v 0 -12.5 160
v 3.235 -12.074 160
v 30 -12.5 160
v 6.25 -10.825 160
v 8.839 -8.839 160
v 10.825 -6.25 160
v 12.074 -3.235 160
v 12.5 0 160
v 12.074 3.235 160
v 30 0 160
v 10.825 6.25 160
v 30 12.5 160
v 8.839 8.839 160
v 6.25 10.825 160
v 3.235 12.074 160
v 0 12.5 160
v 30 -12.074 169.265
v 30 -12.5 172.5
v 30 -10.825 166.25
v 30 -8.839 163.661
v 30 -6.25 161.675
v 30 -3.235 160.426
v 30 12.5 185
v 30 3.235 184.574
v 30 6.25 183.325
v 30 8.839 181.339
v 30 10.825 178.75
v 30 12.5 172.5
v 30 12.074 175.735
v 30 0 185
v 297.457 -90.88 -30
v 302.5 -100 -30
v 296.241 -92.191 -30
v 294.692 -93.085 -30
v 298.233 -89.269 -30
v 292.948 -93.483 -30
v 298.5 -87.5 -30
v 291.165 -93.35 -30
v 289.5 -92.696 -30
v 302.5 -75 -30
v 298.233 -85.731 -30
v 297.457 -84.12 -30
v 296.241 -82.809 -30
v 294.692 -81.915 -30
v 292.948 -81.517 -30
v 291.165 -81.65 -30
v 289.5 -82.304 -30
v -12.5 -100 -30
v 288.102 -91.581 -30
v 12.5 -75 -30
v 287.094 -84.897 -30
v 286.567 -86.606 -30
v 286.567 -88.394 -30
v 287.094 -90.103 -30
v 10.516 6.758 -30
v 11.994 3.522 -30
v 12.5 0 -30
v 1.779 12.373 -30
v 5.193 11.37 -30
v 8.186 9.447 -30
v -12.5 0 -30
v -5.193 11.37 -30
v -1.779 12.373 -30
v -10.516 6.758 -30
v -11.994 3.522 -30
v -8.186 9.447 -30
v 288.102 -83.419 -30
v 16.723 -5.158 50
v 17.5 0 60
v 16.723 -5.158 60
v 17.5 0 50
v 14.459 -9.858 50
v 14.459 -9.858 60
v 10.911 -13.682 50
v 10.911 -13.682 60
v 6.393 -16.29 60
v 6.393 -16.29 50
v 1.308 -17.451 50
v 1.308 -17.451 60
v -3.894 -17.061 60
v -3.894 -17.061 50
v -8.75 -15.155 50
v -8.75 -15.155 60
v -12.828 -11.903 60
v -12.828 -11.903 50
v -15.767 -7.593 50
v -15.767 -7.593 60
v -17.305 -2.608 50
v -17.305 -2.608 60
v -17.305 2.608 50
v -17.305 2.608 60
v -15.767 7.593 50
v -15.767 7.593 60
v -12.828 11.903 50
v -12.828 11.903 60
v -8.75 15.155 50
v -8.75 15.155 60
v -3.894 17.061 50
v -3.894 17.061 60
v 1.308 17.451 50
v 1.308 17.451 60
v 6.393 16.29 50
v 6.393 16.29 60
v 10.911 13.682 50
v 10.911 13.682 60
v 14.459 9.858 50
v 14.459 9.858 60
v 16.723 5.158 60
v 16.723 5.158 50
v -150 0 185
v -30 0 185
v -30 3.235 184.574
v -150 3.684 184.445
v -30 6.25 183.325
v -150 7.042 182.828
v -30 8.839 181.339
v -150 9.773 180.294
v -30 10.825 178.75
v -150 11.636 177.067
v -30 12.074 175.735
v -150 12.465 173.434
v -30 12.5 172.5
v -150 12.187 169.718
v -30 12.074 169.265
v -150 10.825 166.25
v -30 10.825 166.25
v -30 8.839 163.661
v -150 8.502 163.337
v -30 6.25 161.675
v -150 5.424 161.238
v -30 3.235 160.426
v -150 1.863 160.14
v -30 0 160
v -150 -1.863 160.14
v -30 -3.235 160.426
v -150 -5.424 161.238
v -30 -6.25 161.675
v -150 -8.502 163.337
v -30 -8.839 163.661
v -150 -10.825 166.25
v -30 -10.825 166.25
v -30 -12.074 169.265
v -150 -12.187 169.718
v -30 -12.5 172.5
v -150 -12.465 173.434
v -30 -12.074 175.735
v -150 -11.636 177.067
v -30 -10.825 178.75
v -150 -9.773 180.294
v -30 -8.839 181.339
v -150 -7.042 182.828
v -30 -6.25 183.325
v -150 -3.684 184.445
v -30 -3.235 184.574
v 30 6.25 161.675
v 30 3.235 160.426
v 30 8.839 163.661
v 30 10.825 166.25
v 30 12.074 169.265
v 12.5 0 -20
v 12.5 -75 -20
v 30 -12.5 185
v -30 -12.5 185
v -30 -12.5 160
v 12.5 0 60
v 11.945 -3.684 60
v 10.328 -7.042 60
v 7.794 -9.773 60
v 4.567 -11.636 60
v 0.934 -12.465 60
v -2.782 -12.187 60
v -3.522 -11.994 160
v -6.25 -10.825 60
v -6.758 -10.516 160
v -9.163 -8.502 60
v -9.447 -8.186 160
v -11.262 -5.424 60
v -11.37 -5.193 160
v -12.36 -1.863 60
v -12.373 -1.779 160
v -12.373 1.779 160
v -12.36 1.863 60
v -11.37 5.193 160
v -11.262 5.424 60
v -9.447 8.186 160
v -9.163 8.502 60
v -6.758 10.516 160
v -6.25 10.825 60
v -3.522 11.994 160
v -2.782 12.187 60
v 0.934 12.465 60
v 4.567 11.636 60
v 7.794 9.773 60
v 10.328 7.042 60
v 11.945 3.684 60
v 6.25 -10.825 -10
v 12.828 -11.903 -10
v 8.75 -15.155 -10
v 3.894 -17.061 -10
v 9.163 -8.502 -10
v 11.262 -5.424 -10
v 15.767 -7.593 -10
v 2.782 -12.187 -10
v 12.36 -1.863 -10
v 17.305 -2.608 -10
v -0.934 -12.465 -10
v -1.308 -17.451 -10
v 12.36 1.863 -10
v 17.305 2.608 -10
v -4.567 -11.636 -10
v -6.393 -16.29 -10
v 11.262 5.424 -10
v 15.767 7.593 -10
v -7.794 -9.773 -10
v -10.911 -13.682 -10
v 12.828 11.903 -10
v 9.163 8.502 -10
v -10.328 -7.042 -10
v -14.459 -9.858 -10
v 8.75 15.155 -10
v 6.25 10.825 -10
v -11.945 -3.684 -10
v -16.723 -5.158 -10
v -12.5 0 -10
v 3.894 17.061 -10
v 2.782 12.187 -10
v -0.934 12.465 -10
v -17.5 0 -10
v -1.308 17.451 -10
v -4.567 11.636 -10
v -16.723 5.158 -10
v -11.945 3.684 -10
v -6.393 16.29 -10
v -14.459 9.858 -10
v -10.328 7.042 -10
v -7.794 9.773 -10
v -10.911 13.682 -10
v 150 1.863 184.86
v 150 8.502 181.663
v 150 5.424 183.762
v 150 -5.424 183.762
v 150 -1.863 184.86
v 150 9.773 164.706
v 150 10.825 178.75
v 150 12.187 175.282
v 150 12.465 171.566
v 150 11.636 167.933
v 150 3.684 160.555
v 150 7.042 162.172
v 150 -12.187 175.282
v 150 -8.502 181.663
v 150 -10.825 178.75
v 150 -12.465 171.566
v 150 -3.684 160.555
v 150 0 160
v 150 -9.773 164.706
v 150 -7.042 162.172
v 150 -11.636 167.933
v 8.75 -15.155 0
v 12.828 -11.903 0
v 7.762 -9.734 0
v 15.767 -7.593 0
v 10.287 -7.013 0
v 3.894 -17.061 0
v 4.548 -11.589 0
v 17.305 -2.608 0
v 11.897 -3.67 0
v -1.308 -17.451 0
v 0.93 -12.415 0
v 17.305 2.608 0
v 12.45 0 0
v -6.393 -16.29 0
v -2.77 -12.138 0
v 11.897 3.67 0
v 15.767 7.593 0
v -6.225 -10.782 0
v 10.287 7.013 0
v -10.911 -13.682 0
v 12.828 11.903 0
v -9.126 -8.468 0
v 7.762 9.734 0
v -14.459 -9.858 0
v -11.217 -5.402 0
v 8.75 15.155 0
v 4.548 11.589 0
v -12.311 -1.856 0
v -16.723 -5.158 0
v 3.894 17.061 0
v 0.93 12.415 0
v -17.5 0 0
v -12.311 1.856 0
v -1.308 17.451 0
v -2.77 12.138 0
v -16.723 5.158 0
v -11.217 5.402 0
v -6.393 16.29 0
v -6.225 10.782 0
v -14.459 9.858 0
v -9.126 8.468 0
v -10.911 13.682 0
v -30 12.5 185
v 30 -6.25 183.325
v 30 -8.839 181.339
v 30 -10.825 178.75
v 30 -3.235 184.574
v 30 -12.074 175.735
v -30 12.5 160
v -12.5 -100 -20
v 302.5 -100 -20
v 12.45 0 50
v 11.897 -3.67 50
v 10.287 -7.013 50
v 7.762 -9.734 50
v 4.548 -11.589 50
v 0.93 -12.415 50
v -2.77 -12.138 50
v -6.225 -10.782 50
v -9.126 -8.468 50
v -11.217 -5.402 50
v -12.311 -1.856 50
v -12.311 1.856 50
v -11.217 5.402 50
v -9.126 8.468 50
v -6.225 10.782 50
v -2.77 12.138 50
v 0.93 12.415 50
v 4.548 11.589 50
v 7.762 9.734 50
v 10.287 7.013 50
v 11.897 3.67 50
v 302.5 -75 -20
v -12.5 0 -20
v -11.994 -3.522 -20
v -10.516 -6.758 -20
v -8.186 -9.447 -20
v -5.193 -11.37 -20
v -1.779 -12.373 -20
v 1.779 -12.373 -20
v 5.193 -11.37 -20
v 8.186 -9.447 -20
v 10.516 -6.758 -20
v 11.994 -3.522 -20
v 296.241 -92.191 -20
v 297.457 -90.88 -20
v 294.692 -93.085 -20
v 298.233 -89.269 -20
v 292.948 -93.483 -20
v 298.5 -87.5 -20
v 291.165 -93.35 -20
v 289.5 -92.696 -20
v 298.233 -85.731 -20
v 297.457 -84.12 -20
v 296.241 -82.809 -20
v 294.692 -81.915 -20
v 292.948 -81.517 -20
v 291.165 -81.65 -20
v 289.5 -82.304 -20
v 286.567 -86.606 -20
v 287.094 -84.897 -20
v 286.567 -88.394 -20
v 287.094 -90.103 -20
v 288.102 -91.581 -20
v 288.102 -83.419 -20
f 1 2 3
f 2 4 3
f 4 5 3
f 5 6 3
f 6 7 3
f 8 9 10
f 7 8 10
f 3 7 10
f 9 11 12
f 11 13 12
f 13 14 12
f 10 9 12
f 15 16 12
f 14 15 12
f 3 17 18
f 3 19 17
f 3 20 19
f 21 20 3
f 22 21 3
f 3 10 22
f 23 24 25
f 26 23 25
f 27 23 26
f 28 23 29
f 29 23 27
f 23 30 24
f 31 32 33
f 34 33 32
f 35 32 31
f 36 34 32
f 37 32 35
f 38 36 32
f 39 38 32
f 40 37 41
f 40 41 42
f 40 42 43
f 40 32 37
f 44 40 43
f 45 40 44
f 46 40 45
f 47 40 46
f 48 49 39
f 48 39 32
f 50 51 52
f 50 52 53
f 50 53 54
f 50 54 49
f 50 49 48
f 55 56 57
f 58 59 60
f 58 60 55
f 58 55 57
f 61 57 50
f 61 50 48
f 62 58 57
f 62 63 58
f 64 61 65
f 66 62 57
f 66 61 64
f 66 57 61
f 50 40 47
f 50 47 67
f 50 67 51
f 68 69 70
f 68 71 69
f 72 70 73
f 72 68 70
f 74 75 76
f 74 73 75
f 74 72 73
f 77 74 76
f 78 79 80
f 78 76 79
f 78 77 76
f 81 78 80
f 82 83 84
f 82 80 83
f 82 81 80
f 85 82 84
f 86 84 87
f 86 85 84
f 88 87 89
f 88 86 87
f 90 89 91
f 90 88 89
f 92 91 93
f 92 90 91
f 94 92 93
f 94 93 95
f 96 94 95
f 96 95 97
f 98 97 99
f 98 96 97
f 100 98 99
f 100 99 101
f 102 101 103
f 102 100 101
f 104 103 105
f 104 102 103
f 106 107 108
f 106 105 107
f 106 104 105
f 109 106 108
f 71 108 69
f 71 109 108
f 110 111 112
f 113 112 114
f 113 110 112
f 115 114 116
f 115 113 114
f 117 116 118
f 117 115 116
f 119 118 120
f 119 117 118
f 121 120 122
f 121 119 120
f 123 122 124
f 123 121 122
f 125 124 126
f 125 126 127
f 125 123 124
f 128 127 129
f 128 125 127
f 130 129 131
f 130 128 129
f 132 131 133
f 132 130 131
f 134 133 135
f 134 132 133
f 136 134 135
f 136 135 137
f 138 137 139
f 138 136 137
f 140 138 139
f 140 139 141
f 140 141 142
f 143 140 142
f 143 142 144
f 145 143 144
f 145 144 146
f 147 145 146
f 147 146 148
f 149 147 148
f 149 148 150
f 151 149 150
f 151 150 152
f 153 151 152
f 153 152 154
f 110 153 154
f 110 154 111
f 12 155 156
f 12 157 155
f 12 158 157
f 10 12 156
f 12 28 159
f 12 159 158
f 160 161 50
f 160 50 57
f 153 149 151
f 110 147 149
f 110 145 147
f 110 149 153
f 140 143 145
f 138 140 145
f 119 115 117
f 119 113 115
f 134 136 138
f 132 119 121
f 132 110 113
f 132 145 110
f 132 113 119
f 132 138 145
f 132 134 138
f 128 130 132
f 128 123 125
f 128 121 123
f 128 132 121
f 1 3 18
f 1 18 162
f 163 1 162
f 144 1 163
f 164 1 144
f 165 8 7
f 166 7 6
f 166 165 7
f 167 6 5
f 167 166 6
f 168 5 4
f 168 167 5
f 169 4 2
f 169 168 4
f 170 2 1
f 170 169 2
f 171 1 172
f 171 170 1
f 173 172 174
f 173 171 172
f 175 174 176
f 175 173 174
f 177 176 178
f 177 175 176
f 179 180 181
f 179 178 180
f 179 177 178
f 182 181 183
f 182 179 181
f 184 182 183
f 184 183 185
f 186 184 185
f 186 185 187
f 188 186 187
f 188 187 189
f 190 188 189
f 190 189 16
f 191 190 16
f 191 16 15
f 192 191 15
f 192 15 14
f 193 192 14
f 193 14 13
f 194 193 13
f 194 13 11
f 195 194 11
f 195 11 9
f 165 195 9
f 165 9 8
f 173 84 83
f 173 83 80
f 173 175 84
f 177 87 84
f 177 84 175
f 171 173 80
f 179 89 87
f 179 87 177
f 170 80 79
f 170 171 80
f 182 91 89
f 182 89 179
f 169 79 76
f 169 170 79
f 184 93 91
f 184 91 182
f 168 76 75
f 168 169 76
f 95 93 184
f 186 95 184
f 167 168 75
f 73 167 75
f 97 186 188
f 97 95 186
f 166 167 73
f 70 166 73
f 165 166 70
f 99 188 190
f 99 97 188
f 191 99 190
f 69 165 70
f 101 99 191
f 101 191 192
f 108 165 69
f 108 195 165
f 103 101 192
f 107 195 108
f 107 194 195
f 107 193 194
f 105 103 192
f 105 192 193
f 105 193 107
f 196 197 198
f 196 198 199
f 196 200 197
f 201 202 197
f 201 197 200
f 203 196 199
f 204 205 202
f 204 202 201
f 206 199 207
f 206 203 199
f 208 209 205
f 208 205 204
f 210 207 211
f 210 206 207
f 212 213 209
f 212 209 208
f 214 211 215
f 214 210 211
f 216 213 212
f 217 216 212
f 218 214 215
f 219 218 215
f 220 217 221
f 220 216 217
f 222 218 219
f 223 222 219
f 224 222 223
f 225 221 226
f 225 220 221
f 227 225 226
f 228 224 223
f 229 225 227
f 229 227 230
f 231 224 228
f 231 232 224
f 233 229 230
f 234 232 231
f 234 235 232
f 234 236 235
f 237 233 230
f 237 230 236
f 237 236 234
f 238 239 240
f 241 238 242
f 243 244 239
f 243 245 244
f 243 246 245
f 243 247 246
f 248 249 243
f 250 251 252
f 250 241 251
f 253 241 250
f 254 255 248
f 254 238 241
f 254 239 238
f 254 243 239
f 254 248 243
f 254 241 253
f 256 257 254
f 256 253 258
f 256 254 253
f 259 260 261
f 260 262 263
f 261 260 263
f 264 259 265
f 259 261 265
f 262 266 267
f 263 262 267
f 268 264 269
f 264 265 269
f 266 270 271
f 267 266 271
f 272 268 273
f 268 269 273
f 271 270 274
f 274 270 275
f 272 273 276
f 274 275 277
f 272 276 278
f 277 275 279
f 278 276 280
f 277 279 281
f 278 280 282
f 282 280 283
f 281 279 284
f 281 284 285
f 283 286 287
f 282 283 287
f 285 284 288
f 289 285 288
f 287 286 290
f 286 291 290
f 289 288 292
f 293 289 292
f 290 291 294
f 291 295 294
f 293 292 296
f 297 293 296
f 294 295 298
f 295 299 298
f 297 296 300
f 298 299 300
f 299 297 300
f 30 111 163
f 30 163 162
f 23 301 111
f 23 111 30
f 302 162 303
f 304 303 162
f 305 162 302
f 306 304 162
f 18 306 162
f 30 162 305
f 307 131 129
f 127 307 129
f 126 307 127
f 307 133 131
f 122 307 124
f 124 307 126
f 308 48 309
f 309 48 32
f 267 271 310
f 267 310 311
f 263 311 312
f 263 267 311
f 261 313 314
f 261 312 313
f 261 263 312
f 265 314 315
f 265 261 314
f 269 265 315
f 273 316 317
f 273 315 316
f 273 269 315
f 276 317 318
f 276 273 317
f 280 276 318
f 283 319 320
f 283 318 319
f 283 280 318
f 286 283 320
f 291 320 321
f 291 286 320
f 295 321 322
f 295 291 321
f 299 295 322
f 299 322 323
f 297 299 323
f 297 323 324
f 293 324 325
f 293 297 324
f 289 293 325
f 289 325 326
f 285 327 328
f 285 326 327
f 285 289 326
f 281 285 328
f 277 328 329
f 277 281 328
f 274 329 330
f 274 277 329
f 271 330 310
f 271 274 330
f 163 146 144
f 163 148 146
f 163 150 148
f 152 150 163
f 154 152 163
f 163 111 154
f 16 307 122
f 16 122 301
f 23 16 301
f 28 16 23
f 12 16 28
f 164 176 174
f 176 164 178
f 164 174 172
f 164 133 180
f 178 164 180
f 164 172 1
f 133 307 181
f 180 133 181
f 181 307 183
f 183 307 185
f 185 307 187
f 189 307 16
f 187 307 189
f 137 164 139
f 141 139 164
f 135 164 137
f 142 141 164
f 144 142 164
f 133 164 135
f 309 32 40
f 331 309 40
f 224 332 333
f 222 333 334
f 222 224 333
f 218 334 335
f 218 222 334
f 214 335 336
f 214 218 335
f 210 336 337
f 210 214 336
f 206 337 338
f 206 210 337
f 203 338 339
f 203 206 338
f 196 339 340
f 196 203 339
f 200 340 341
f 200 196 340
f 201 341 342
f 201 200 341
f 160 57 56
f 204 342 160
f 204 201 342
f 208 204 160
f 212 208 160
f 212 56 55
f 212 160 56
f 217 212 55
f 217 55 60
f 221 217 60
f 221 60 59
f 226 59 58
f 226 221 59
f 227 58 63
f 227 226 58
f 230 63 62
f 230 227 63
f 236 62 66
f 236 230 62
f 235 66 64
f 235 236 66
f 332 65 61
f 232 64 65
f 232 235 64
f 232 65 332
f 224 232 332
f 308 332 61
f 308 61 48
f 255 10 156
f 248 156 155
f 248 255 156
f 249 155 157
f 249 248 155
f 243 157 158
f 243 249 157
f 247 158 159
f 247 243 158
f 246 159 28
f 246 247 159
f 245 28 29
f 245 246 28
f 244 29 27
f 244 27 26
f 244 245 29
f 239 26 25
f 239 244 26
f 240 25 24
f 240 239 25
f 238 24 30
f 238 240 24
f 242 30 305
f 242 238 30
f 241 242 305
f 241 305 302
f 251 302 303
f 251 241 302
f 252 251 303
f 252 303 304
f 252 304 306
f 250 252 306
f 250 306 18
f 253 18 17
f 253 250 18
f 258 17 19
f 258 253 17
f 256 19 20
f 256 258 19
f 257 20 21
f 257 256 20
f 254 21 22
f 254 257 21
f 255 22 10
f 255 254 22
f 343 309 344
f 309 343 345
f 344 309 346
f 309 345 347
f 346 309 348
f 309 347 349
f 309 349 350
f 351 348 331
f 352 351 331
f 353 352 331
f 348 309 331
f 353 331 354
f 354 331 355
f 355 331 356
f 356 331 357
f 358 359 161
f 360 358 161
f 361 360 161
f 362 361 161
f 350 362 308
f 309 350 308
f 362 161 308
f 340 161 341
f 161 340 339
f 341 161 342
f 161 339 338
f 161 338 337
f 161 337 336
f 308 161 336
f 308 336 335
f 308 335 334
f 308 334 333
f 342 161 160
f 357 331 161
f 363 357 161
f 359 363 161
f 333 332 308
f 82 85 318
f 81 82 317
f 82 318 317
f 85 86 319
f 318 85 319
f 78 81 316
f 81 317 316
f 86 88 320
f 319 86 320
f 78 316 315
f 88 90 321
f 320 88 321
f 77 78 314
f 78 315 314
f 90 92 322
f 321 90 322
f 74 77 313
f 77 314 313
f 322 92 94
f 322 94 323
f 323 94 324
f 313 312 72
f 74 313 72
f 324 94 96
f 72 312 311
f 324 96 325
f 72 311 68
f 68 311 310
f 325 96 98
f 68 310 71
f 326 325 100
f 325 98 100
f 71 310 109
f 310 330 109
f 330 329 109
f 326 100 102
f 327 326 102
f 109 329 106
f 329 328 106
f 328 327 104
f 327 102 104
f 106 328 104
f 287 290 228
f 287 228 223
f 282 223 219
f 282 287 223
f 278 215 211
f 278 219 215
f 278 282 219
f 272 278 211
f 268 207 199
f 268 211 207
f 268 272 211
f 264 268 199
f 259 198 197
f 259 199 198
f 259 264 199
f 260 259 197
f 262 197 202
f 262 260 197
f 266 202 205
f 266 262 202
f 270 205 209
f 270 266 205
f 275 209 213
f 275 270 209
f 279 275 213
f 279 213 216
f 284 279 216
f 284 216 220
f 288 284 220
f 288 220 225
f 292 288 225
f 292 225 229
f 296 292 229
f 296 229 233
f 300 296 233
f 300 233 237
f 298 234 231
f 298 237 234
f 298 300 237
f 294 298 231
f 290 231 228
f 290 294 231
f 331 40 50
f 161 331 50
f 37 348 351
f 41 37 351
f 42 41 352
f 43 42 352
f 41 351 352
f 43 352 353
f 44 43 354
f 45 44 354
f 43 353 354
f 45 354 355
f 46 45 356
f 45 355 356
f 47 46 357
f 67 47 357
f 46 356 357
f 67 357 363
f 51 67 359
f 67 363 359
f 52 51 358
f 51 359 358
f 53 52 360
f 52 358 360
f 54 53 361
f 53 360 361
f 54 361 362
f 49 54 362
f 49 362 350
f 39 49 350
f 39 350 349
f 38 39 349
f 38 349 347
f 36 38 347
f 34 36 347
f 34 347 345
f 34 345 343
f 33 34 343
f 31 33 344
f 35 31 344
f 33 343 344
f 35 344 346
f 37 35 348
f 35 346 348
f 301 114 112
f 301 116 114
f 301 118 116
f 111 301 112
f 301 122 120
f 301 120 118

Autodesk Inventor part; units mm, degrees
ref_plane "YZ Plane" through (0, 0, 0) normal (1, 0, 0) x (0, 1, 0)
ref_plane "XZ Plane" through (0, 0, 0) normal (0, 1, 0) x (-1, 0, 0)
ref_plane "XY Plane" through (0, 0, 0) normal (0, 0, 1) x (1, 0, 0)
sketch "Skizze1" plane through (0, 0, 0) normal (0, 0, 1) x (1, 0, 0)
  circle A0 centre (0, 0) radius 12.45
  dimension "d0" = 24.9
extrude "Extrusion1" add sketch "Skizze1" along normal blind 50
sketch "Skizze2" plane through (0, 0, 50) normal (0, 0, 1) x (1, 0, 0)
  circle A0 centre (0, 0) radius 17.5
  dimension "d3" = 35
extrude "Extrusion2" add sketch "Skizze2" along normal blind 10
sketch "Skizze3" plane through (0, 0, 0) normal (0, 0, -1) x (-1, 0, 0)
  circle A0 centre (0, 0) radius 17.5
  dimension "d6" = 35
extrude "Extrusion3" add sketch "Skizze3" along normal blind 10
sketch "Skizze4" plane through (0, 0, -10) normal (0, 0, -1) x (-1, 0, 0)
  circle A0 centre (0, 0) radius 12.5
  dimension "d9" = 25
extrude "Extrusion4" add sketch "Skizze4" along normal blind 10
sketch "Skizze5" plane through (0, 0, 60) normal (0, 0, 1) x (1, 0, 0)
  circle A0 centre (0, 0) radius 12.5
  dimension "d12" = 25
extrude "Extrusion5" add sketch "Skizze5" along normal blind 100
sketch "Skizze6" plane through (0, 0, -20) normal (0, 0, -1) x (-1, 0, 0)
  line L0 (-12.5, 0) -> (12.5, 0)
  line L1 (12.5, 0) -> (12.5, -100)
  line L2 (12.5, -100) -> (-12.5, -100)
  line L3 (-12.5, -100) -> (-12.5, 0)
  circle A0 centre (0, 0) radius 17.5 projected
  arc A1 (12.5, 0) -> (-12.5, 0) centre (0, 0) ccw
  line L4 (0, 0) -> (12.5, 0) construction
  line L5 (0, 0) -> (-12.5, 0) construction
  dimension "d15" = 25
  dimension "d16" = 12.5
  dimension "d17" = 0
  dimension "d18" = 100
  dimension "d19" = 180
extrude "Extrusion6" add sketch "Skizze6" along normal blind 10 contours A1 L0 | L0 L1 A0 L3 | A0 L1 L2 L3
sketch "Skizze8" plane through (0, 0, -30) normal (0, 0, -1) x (-1, 0, 0)
  line L0 (-12.5, -100) -> (-302.5, -100)
  line L1 (-302.5, -100) -> (-302.5, -75)
  line L2 (-302.5, -75) -> (-12.5, -75)
  line L3 (-12.5, -75) -> (-12.5, -100)
  line L4 (-12.5, 0) -> (-12.5, -100) projected
  line L5 (-12.5, -100) -> (12.5, -100) projected
  point P0 (0, 0)
  dimension "d23" = 25
  dimension "d24" = 0
  dimension "d26" = 290
  dimension "d29" = 0
extrude "Extrusion7" add sketch "Skizze8" against normal blind 10
sketch "Skizze9" plane through (0, 0, -20) normal (0, 0, 1) x (1, 0, 0)
  circle A0 centre (292.5, -87.5) radius 6
  line L0 (302.5, -100) -> (302.5, -75) projected
  line L1 (-12.5, -100) -> (302.5, -100) projected
  point P0 (0, 0)
  dimension "d30" = 12
  dimension "d31" = 10
  dimension "d32" = 12.5
extrude "Extrusion8" cut sketch "Skizze9" against normal up to surface (10 mm away)
sketch "Skizze10" plane through (0, 0, 160) normal (0, 0, 1) x (1, 0, 0)
  line L0 (150, -12.5) -> (-150, -12.5)
  line L1 (-150, -12.5) -> (-150, 12.5)
  line L2 (-150, 12.5) -> (150, 12.5)
  line L3 (150, 12.5) -> (150, -12.5)
  point P0 (0, 0)
  dimension "d35" = 25
  dimension "d36" = 12.5
  dimension "d37" = 300
  dimension "d38" = 150
extrude "Extrusion9" add sketch "Skizze10" along normal blind 25
sketch "Skizze11" plane through (150, -12.5, 160) normal (1, 0, 0) x (0, 0, -1)
  line L0 (0, 0) -> (-25, 0) projected
  line L1 (-25, 25) -> (-25, 0) projected
  line L2 (0, 0) -> (-25, 0)
  line L3 (-25, 0) -> (-25, 25)
  line L4 (-25, 25) -> (0, 25)
  line L5 (0, 25) -> (0, 0)
  circle A0 centre (-12.5, 12.5) radius 12.5
  point P0 (160, 12.5)
  point P1 (-25, 12.5)
  point P2 (-12.5, 25)
  point P3 (0, 12.5)
  point P4 (-12.5, 0)
extrude "Extrusion10" cut sketch "Skizze11" against normal blind 120 contours L0 A0 L5 | L0 L1 A0 | A0 L4 L5 | L1 L4 A0
sketch "Skizze12" plane through (-150, -12.5, 160) normal (-1, 0, 0) x (0, 0, 1)
  line L0 (0, 25) -> (25, 25) projected
  line L1 (0, 0) -> (25, 0)
  line L2 (25, 0) -> (25, 25)
  line L3 (25, 25) -> (0, 25)
  line L4 (0, 25) -> (0, 0)
  circle A0 centre (12.5, 12.5) radius 12.5
  point P0 (-160, 12.5)
  point P1 (12.5, 25)
  point P2 (25, 12.5)
  point P3 (12.5, 0)
  point P4 (0, 12.5)
extrude "Extrusion11" cut sketch "Skizze12" against normal blind 120 contours L0 A0 L4 | L0 L2 A0 | A0 L1 L4 | L2 L1 A0
properties part number "Lenkung_vorne"
